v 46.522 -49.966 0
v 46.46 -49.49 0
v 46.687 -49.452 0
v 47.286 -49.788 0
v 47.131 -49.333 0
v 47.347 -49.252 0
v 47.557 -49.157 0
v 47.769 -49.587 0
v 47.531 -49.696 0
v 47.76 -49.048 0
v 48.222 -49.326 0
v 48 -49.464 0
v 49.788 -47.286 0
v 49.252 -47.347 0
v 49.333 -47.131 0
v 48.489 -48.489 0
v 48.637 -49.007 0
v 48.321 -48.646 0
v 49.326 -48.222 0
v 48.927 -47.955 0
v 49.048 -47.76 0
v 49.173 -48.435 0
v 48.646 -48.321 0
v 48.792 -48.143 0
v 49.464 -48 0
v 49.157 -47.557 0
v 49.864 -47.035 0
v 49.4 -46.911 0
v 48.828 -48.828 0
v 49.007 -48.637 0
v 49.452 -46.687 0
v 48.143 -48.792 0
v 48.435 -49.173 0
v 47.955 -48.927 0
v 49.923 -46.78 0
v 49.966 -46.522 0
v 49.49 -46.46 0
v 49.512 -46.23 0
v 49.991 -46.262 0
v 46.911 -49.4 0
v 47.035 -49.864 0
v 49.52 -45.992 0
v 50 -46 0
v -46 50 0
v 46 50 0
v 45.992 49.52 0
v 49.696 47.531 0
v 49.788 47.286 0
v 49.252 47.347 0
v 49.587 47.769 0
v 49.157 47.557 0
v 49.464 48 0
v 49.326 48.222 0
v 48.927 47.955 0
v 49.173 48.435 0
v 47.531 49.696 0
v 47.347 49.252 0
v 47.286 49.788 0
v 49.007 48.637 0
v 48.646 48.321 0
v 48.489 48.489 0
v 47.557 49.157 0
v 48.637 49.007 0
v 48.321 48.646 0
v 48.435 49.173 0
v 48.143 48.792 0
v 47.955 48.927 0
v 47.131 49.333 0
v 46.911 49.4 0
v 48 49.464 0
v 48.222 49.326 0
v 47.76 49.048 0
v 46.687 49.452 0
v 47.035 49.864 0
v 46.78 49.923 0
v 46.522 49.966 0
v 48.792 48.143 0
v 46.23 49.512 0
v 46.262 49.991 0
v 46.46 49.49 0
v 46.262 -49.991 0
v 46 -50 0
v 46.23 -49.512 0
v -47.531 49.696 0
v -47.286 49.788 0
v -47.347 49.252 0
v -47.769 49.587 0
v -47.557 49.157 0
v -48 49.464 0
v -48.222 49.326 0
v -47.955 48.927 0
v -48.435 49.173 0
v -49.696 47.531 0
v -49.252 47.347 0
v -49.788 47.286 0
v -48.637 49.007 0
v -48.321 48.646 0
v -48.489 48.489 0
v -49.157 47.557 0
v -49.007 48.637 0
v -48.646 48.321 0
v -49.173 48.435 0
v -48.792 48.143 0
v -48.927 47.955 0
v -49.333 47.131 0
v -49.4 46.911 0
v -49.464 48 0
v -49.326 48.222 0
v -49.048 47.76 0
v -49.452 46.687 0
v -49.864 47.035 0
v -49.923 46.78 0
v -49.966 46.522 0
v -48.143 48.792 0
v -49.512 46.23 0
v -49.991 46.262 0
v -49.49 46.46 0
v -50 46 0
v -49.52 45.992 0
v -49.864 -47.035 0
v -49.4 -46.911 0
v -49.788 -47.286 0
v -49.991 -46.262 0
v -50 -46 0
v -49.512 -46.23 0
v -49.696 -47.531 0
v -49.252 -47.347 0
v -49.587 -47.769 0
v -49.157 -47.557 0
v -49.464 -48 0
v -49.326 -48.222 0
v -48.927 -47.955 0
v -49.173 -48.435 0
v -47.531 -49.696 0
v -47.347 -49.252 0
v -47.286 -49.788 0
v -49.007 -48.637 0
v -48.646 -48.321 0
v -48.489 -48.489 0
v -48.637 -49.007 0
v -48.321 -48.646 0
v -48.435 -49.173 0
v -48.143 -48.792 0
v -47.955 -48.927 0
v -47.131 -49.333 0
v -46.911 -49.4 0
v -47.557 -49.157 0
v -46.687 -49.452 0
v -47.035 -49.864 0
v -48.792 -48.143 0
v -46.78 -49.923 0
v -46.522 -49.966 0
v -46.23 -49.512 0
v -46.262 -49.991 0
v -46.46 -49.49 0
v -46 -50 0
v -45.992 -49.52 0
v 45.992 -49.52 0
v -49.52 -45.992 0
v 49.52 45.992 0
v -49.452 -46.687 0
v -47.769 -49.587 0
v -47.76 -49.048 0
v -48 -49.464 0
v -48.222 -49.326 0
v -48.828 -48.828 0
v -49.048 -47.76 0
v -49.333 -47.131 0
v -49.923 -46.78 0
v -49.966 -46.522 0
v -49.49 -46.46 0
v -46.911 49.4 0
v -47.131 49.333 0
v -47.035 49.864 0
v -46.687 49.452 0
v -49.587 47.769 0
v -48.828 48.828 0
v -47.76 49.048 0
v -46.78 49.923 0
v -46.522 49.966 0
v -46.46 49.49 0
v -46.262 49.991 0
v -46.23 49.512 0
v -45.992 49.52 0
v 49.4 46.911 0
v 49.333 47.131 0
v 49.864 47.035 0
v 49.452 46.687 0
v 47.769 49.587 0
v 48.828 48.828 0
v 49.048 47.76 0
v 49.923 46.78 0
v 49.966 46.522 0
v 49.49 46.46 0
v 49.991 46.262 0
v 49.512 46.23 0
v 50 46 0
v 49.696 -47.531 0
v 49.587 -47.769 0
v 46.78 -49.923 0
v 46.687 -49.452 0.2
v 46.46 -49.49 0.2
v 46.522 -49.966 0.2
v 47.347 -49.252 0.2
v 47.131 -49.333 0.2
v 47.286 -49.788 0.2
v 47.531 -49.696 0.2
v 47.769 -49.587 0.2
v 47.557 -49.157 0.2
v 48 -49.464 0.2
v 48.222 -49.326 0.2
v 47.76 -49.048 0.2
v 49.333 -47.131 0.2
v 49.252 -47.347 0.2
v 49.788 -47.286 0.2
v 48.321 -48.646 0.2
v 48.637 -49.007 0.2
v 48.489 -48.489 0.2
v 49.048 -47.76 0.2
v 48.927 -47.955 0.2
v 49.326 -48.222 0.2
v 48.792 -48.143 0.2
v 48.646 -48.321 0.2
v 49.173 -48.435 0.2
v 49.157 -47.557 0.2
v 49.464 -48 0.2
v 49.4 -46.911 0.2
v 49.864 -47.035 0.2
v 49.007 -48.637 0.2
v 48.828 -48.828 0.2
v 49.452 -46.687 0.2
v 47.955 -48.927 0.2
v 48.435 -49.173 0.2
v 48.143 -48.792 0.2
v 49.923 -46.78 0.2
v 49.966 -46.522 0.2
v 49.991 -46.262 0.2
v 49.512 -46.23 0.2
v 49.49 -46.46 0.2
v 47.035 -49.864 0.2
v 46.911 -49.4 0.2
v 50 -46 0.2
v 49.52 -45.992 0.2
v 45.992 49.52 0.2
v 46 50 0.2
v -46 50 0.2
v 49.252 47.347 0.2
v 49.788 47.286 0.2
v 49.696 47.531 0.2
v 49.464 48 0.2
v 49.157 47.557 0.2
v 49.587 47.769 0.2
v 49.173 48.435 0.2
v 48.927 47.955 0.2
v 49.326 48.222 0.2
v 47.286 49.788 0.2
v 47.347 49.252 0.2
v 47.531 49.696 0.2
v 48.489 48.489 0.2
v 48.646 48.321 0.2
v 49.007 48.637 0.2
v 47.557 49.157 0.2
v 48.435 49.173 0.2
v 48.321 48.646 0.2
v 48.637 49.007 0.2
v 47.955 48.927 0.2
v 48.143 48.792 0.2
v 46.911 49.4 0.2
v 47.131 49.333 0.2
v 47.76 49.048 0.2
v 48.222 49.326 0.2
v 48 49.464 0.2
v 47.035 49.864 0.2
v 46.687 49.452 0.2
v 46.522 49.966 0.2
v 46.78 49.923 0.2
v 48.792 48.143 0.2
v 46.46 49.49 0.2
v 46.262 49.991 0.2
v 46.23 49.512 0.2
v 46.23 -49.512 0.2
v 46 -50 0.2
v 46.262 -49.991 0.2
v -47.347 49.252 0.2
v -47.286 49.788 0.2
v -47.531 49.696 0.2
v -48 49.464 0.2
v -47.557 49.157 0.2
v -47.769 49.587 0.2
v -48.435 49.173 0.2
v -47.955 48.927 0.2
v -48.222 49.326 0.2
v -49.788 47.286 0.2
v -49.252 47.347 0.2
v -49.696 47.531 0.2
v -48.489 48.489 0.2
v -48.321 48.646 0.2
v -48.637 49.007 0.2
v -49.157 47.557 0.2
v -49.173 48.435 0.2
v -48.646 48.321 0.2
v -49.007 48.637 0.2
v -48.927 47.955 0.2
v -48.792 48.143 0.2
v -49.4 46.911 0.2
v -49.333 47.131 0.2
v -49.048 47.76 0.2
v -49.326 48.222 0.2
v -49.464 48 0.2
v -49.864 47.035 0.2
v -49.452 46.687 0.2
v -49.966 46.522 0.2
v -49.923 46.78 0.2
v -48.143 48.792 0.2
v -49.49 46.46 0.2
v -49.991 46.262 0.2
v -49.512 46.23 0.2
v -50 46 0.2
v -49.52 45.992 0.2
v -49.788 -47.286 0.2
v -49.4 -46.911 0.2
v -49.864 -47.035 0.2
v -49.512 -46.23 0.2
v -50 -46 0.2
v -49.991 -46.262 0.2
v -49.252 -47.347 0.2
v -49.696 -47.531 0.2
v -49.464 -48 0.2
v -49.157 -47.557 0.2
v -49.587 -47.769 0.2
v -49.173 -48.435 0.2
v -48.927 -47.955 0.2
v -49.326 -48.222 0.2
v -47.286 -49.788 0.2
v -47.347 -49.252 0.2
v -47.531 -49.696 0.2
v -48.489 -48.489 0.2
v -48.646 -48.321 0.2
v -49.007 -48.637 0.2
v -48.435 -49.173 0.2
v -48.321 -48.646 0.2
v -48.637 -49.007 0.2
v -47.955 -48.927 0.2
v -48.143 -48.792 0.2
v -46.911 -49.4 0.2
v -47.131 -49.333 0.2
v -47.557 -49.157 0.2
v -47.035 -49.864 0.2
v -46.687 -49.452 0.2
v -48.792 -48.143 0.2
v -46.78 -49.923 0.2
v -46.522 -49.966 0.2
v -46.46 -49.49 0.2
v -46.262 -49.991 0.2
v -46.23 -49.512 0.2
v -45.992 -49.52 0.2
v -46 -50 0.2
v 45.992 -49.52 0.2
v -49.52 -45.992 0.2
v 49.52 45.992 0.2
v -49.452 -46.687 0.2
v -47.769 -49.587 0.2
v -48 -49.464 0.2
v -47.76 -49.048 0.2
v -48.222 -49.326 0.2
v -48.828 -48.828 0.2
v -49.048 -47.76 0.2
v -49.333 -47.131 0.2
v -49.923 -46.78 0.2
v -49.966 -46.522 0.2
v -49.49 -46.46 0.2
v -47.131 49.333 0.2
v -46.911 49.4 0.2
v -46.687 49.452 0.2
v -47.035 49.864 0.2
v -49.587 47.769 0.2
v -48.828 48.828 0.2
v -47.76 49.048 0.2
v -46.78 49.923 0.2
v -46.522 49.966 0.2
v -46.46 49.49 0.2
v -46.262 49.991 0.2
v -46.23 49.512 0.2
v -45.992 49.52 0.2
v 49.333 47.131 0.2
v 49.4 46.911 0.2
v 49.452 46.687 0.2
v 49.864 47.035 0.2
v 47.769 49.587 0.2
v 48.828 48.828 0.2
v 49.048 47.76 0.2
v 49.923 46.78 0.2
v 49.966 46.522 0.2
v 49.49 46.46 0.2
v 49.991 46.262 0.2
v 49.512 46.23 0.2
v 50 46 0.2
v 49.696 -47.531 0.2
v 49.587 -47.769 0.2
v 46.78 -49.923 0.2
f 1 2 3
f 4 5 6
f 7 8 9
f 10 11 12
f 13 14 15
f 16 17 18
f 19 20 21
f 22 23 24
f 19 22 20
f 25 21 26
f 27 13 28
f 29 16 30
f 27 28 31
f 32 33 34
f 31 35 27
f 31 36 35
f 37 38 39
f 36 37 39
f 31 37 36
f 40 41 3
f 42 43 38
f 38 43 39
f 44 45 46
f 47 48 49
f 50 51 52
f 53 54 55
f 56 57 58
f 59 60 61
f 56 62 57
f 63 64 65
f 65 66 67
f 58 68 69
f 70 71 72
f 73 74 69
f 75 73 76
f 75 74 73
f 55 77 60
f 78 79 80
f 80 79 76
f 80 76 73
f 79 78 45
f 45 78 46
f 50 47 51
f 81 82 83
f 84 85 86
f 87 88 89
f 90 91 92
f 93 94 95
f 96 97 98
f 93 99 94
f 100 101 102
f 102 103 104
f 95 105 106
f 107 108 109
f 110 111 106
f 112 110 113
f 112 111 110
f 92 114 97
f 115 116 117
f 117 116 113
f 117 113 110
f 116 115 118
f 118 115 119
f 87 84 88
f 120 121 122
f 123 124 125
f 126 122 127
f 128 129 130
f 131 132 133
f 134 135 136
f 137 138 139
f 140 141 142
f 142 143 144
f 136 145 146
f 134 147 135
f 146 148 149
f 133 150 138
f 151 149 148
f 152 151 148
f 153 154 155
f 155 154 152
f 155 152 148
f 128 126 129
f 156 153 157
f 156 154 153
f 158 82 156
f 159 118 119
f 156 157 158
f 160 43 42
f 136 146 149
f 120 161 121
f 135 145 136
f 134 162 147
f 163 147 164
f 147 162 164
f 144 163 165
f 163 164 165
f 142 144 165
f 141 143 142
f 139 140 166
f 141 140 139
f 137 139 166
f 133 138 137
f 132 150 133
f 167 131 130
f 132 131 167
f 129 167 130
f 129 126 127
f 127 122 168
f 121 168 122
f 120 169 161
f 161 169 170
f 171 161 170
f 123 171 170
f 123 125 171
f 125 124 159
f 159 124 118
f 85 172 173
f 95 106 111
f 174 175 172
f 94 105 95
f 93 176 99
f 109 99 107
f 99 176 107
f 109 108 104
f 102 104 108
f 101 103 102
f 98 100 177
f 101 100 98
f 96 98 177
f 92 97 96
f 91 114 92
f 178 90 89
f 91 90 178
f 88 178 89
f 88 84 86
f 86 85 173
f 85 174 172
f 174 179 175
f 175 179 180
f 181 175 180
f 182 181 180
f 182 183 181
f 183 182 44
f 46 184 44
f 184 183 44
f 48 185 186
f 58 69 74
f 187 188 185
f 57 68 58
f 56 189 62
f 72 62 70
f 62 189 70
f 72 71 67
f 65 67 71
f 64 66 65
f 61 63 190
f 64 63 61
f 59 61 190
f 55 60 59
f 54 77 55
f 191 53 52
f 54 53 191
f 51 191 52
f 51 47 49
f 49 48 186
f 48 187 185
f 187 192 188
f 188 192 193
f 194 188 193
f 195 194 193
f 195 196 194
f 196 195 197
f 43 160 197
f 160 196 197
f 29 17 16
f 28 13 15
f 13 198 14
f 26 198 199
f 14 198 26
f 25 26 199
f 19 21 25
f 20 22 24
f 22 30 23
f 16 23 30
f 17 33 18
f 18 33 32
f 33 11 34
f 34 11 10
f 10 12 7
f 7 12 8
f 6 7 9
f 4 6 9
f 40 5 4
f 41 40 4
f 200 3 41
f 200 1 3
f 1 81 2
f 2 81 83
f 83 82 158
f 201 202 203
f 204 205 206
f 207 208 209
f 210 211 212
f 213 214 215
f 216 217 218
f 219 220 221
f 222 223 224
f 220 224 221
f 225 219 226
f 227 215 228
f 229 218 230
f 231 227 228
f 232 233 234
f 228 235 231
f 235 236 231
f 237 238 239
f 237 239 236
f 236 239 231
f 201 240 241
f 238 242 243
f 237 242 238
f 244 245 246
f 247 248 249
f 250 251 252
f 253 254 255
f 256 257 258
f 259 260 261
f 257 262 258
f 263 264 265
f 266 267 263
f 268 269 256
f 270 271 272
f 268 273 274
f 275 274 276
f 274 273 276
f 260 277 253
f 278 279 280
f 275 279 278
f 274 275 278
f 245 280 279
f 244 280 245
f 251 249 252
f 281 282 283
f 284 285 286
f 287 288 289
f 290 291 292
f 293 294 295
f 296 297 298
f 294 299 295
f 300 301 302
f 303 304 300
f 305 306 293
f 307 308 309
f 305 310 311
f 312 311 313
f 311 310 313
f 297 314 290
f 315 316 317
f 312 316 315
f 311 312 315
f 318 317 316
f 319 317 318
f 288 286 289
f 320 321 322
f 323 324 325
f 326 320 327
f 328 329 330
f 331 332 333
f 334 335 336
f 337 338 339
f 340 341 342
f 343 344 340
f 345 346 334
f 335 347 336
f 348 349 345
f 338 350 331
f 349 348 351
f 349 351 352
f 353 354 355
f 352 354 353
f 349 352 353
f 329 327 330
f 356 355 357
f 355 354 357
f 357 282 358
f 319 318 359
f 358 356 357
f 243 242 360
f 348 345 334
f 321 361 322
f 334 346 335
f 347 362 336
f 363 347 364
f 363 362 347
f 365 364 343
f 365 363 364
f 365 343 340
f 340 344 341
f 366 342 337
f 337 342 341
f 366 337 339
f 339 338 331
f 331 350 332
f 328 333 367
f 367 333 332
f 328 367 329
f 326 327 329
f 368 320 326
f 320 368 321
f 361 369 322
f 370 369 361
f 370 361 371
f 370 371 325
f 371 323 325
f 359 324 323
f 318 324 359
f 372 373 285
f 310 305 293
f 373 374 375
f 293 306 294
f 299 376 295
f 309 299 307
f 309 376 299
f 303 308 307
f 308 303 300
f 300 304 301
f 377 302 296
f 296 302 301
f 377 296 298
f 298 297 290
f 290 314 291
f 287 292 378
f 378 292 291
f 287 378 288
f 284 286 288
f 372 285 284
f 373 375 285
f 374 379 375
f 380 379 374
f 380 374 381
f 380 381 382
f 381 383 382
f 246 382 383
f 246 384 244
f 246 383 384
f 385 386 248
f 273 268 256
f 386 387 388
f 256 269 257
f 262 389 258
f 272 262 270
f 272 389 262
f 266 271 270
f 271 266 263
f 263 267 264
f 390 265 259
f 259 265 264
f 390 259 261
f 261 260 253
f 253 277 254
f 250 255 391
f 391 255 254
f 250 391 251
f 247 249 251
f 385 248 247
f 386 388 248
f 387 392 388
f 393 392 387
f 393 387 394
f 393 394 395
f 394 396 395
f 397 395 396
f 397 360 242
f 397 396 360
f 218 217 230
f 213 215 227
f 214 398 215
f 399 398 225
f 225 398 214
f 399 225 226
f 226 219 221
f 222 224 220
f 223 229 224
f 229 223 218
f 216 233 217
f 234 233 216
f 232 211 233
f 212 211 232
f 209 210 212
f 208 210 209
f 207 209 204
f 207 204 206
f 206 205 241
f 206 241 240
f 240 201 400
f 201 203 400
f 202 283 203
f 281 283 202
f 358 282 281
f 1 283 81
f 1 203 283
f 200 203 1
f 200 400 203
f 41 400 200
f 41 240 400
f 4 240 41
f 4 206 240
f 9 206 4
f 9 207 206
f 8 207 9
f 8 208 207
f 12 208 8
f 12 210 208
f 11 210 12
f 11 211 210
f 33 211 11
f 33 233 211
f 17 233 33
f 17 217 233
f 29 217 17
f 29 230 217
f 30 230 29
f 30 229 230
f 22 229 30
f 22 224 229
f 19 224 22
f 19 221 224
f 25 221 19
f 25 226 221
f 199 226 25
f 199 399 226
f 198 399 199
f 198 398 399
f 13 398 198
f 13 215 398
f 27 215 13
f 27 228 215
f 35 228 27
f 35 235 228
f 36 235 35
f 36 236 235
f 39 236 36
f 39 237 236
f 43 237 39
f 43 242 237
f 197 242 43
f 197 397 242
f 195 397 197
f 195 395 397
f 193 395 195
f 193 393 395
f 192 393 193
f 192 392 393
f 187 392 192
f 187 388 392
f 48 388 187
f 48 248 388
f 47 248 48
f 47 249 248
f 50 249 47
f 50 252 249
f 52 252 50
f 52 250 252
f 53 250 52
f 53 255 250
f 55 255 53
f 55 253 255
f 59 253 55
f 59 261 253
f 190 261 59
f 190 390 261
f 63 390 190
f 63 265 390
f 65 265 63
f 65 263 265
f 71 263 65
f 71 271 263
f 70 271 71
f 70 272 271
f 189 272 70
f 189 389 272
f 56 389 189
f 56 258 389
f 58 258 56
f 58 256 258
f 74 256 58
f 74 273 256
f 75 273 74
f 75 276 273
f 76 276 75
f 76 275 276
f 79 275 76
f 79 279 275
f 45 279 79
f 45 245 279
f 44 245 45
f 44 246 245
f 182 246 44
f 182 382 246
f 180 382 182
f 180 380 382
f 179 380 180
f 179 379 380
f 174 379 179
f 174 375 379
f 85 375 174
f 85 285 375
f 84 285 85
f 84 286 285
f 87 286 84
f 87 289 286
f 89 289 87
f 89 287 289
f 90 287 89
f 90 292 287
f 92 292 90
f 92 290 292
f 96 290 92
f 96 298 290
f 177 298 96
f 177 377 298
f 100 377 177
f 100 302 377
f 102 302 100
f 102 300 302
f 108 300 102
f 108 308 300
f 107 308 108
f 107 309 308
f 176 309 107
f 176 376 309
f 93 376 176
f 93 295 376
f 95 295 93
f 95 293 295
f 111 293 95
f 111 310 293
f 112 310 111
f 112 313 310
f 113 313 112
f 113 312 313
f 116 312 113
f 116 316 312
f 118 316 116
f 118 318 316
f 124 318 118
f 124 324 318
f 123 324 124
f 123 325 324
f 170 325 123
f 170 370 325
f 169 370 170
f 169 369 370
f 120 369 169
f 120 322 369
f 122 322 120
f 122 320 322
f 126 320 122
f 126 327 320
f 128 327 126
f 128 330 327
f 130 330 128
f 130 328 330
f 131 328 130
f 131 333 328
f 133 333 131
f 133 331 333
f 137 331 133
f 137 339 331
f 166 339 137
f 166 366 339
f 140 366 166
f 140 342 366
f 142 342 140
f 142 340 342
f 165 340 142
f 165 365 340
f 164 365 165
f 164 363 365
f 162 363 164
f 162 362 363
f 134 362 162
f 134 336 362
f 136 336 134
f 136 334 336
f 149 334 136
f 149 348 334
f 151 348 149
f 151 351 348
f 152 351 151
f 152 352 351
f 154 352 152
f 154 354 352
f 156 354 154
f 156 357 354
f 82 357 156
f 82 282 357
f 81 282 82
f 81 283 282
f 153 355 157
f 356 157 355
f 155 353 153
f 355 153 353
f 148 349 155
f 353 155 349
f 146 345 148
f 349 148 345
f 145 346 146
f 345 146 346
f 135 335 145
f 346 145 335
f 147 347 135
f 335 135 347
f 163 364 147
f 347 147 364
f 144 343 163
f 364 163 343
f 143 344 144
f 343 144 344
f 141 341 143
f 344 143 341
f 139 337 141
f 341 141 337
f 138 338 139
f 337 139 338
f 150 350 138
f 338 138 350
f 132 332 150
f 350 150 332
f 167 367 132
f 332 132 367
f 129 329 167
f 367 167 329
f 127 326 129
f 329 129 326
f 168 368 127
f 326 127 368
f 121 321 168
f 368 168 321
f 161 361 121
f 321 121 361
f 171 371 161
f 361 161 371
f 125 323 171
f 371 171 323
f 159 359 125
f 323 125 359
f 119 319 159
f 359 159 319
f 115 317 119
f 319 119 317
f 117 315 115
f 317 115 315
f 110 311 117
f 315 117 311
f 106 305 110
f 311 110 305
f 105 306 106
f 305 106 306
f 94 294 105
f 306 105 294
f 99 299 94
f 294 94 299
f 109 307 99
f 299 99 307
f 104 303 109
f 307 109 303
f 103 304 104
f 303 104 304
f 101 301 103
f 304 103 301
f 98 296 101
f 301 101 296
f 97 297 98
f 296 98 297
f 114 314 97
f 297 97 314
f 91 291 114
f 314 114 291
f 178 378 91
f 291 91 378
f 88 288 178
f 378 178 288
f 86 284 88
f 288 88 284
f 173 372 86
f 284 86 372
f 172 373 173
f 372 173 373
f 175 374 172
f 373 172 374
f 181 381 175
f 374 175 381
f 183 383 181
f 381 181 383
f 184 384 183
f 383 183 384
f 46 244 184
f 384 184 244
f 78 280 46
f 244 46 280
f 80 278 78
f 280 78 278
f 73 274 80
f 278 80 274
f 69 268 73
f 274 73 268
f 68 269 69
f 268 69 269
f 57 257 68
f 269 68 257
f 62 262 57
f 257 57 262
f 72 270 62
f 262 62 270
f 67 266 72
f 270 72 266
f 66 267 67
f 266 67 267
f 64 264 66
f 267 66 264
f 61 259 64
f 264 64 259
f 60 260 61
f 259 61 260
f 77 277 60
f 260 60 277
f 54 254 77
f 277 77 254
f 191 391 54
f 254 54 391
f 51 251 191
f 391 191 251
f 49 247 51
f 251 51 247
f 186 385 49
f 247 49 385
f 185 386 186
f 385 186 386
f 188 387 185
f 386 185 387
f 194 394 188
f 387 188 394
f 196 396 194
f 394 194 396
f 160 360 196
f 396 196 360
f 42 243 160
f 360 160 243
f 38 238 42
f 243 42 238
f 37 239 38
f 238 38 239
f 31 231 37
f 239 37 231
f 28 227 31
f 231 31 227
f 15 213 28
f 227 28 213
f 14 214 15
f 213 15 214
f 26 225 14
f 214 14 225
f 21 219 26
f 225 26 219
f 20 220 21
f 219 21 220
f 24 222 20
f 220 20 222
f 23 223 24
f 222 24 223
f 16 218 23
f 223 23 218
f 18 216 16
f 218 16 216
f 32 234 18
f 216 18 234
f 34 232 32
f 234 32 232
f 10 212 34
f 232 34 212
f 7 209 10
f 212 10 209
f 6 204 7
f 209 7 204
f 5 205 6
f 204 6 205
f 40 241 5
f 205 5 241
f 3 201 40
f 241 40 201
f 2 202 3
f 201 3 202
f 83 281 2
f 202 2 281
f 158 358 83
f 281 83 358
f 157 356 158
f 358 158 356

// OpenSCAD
/*
YOLO Print-Head Tracking Test Set
One design per export. Set `test` below, preview (F5), then export STL (F6).

Suggested Cura settings
- Layer height: 0.20 mm
- Wall line count: 1
- Top/bottom layers: 0
- Infill: 0%
- Supports: off
- Adhesion: skirt or brim only if required

Tests:
  "square_1", "square_2", "square_3"
  "zigzag_1", "zigzag_2"
  "curve_1", "curve_2"
  "normal_1", "normal_2", "normal_3", "normal_4", "normal_5"
*/

$fn = 96;
test = "square_1";
line_w = 0.48;
layer_h = 0.20;

// OpenSCAD 2D path helper: creates a rounded, extrudable path from points.
module path(points, width=line_w, h=layer_h) {
    linear_extrude(height=h)
        union() {
            for (i = [0 : len(points)-2])
                hull() {
                    translate(points[i]) circle(d=width);
                    translate(points[i+1]) circle(d=width);
                }
            for (p = points) translate(p) circle(d=width);
        }
}

module rounded_square(size=100, r=4) {
    linear_extrude(height=layer_h)
        difference() {
            offset(r=r) square([size-2*r, size-2*r], center=true);
            offset(delta=-line_w) offset(r=r) square([size-2*r, size-2*r], center=true);
        }
}

module circle_path(d=85) {
    linear_extrude(height=layer_h)
        difference() {
            circle(d=d);
            circle(d=d-2*line_w);
        }
}

module arc_path(r=52, a0=-145, a1=145, steps=80) {
    pts = [for (i=[0:steps]) let(a=a0+(a1-a0)*i/steps) [r*cos(a), r*sin(a)]];
    path(pts);
}

module spiral_path(r0=8, r1=48, turns=2.25, steps=160) {
    pts = [for (i=[0:steps]) let(t=i/steps, a=360*turns*t, r=r0+(r1-r0)*t) [r*cos(a), r*sin(a)]];
    path(pts);
}

module sample_square_1() { rounded_square(100, 4); }
module sample_square_2() { rounded_square(70, 3); }
module sample_square_3() { rounded_square(125, 5); }

module sample_zigzag_1() {
    path([[-80,-45],[-40,45],[0,-45],[40,45],[80,-45]]);
}

module sample_zigzag_2() {
    path([[-85,-50],[-55,50],[-25,-50],[5,50],[35,-50],[65,50],[85,-50]]);
}

module sample_curve_1() { circle_path(95); }
module sample_curve_2() { arc_path(); }

// Short multi-layer-style objects. Slice normally; they introduce progressively more occlusion/clutter.
module sample_normal_1() {
    // Hollow 30 mm cube: simple walls, low clutter.
    difference() {
        cube([30,30,12], center=true);
        translate([0,0,1]) cube([29.04,29.04,14], center=true);
    }
}

module sample_normal_2() {
    // Cylinder: continuously changing head direction.
    difference() {
        cylinder(h=18, d=34, center=false);
        translate([0,0,-1]) cylinder(h=20, d=33.04, center=false);
    }
}

module sample_normal_3() {
    // Two small separated towers: travel moves plus moderate occlusion.
    for (x=[-28,28])
        translate([x,0,0])
            difference() {
                cylinder(h=24, d=24);
                translate([0,0,-1]) cylinder(h=26, d=23.04);
            }
}

module sample_normal_4() {
    // Frame with cross ribs: more travel paths and interior features.
    difference() {
        cube([70,70,16], center=true);
        cube([62,62,18], center=true);
    }
    translate([0,0,8]) cube([64,line_w,layer_h], center=true);
    translate([0,0,8]) cube([line_w,64,layer_h], center=true);
}

module sample_normal_5() {
    // Three towers of varying height: strongest occlusion and changing background.
    translate([-28,-20,0]) cylinder(h=12,d=24);
    translate([28,-20,0]) cylinder(h=24,d=24);
    translate([0,28,0]) cylinder(h=36,d=24);
}

if (test == "square_1") sample_square_1();
else if (test == "square_2") sample_square_2();
else if (test == "square_3") sample_square_3();
else if (test == "zigzag_1") sample_zigzag_1();
else if (test == "zigzag_2") sample_zigzag_2();
else if (test == "curve_1") sample_curve_1();
else if (test == "curve_2") sample_curve_2();
else if (test == "normal_1") sample_normal_1();
else if (test == "normal_2") sample_normal_2();
else if (test == "normal_3") sample_normal_3();
else if (test == "normal_4") sample_normal_4();
else if (test == "normal_5") sample_normal_5();
else echo("Unknown test name.");
